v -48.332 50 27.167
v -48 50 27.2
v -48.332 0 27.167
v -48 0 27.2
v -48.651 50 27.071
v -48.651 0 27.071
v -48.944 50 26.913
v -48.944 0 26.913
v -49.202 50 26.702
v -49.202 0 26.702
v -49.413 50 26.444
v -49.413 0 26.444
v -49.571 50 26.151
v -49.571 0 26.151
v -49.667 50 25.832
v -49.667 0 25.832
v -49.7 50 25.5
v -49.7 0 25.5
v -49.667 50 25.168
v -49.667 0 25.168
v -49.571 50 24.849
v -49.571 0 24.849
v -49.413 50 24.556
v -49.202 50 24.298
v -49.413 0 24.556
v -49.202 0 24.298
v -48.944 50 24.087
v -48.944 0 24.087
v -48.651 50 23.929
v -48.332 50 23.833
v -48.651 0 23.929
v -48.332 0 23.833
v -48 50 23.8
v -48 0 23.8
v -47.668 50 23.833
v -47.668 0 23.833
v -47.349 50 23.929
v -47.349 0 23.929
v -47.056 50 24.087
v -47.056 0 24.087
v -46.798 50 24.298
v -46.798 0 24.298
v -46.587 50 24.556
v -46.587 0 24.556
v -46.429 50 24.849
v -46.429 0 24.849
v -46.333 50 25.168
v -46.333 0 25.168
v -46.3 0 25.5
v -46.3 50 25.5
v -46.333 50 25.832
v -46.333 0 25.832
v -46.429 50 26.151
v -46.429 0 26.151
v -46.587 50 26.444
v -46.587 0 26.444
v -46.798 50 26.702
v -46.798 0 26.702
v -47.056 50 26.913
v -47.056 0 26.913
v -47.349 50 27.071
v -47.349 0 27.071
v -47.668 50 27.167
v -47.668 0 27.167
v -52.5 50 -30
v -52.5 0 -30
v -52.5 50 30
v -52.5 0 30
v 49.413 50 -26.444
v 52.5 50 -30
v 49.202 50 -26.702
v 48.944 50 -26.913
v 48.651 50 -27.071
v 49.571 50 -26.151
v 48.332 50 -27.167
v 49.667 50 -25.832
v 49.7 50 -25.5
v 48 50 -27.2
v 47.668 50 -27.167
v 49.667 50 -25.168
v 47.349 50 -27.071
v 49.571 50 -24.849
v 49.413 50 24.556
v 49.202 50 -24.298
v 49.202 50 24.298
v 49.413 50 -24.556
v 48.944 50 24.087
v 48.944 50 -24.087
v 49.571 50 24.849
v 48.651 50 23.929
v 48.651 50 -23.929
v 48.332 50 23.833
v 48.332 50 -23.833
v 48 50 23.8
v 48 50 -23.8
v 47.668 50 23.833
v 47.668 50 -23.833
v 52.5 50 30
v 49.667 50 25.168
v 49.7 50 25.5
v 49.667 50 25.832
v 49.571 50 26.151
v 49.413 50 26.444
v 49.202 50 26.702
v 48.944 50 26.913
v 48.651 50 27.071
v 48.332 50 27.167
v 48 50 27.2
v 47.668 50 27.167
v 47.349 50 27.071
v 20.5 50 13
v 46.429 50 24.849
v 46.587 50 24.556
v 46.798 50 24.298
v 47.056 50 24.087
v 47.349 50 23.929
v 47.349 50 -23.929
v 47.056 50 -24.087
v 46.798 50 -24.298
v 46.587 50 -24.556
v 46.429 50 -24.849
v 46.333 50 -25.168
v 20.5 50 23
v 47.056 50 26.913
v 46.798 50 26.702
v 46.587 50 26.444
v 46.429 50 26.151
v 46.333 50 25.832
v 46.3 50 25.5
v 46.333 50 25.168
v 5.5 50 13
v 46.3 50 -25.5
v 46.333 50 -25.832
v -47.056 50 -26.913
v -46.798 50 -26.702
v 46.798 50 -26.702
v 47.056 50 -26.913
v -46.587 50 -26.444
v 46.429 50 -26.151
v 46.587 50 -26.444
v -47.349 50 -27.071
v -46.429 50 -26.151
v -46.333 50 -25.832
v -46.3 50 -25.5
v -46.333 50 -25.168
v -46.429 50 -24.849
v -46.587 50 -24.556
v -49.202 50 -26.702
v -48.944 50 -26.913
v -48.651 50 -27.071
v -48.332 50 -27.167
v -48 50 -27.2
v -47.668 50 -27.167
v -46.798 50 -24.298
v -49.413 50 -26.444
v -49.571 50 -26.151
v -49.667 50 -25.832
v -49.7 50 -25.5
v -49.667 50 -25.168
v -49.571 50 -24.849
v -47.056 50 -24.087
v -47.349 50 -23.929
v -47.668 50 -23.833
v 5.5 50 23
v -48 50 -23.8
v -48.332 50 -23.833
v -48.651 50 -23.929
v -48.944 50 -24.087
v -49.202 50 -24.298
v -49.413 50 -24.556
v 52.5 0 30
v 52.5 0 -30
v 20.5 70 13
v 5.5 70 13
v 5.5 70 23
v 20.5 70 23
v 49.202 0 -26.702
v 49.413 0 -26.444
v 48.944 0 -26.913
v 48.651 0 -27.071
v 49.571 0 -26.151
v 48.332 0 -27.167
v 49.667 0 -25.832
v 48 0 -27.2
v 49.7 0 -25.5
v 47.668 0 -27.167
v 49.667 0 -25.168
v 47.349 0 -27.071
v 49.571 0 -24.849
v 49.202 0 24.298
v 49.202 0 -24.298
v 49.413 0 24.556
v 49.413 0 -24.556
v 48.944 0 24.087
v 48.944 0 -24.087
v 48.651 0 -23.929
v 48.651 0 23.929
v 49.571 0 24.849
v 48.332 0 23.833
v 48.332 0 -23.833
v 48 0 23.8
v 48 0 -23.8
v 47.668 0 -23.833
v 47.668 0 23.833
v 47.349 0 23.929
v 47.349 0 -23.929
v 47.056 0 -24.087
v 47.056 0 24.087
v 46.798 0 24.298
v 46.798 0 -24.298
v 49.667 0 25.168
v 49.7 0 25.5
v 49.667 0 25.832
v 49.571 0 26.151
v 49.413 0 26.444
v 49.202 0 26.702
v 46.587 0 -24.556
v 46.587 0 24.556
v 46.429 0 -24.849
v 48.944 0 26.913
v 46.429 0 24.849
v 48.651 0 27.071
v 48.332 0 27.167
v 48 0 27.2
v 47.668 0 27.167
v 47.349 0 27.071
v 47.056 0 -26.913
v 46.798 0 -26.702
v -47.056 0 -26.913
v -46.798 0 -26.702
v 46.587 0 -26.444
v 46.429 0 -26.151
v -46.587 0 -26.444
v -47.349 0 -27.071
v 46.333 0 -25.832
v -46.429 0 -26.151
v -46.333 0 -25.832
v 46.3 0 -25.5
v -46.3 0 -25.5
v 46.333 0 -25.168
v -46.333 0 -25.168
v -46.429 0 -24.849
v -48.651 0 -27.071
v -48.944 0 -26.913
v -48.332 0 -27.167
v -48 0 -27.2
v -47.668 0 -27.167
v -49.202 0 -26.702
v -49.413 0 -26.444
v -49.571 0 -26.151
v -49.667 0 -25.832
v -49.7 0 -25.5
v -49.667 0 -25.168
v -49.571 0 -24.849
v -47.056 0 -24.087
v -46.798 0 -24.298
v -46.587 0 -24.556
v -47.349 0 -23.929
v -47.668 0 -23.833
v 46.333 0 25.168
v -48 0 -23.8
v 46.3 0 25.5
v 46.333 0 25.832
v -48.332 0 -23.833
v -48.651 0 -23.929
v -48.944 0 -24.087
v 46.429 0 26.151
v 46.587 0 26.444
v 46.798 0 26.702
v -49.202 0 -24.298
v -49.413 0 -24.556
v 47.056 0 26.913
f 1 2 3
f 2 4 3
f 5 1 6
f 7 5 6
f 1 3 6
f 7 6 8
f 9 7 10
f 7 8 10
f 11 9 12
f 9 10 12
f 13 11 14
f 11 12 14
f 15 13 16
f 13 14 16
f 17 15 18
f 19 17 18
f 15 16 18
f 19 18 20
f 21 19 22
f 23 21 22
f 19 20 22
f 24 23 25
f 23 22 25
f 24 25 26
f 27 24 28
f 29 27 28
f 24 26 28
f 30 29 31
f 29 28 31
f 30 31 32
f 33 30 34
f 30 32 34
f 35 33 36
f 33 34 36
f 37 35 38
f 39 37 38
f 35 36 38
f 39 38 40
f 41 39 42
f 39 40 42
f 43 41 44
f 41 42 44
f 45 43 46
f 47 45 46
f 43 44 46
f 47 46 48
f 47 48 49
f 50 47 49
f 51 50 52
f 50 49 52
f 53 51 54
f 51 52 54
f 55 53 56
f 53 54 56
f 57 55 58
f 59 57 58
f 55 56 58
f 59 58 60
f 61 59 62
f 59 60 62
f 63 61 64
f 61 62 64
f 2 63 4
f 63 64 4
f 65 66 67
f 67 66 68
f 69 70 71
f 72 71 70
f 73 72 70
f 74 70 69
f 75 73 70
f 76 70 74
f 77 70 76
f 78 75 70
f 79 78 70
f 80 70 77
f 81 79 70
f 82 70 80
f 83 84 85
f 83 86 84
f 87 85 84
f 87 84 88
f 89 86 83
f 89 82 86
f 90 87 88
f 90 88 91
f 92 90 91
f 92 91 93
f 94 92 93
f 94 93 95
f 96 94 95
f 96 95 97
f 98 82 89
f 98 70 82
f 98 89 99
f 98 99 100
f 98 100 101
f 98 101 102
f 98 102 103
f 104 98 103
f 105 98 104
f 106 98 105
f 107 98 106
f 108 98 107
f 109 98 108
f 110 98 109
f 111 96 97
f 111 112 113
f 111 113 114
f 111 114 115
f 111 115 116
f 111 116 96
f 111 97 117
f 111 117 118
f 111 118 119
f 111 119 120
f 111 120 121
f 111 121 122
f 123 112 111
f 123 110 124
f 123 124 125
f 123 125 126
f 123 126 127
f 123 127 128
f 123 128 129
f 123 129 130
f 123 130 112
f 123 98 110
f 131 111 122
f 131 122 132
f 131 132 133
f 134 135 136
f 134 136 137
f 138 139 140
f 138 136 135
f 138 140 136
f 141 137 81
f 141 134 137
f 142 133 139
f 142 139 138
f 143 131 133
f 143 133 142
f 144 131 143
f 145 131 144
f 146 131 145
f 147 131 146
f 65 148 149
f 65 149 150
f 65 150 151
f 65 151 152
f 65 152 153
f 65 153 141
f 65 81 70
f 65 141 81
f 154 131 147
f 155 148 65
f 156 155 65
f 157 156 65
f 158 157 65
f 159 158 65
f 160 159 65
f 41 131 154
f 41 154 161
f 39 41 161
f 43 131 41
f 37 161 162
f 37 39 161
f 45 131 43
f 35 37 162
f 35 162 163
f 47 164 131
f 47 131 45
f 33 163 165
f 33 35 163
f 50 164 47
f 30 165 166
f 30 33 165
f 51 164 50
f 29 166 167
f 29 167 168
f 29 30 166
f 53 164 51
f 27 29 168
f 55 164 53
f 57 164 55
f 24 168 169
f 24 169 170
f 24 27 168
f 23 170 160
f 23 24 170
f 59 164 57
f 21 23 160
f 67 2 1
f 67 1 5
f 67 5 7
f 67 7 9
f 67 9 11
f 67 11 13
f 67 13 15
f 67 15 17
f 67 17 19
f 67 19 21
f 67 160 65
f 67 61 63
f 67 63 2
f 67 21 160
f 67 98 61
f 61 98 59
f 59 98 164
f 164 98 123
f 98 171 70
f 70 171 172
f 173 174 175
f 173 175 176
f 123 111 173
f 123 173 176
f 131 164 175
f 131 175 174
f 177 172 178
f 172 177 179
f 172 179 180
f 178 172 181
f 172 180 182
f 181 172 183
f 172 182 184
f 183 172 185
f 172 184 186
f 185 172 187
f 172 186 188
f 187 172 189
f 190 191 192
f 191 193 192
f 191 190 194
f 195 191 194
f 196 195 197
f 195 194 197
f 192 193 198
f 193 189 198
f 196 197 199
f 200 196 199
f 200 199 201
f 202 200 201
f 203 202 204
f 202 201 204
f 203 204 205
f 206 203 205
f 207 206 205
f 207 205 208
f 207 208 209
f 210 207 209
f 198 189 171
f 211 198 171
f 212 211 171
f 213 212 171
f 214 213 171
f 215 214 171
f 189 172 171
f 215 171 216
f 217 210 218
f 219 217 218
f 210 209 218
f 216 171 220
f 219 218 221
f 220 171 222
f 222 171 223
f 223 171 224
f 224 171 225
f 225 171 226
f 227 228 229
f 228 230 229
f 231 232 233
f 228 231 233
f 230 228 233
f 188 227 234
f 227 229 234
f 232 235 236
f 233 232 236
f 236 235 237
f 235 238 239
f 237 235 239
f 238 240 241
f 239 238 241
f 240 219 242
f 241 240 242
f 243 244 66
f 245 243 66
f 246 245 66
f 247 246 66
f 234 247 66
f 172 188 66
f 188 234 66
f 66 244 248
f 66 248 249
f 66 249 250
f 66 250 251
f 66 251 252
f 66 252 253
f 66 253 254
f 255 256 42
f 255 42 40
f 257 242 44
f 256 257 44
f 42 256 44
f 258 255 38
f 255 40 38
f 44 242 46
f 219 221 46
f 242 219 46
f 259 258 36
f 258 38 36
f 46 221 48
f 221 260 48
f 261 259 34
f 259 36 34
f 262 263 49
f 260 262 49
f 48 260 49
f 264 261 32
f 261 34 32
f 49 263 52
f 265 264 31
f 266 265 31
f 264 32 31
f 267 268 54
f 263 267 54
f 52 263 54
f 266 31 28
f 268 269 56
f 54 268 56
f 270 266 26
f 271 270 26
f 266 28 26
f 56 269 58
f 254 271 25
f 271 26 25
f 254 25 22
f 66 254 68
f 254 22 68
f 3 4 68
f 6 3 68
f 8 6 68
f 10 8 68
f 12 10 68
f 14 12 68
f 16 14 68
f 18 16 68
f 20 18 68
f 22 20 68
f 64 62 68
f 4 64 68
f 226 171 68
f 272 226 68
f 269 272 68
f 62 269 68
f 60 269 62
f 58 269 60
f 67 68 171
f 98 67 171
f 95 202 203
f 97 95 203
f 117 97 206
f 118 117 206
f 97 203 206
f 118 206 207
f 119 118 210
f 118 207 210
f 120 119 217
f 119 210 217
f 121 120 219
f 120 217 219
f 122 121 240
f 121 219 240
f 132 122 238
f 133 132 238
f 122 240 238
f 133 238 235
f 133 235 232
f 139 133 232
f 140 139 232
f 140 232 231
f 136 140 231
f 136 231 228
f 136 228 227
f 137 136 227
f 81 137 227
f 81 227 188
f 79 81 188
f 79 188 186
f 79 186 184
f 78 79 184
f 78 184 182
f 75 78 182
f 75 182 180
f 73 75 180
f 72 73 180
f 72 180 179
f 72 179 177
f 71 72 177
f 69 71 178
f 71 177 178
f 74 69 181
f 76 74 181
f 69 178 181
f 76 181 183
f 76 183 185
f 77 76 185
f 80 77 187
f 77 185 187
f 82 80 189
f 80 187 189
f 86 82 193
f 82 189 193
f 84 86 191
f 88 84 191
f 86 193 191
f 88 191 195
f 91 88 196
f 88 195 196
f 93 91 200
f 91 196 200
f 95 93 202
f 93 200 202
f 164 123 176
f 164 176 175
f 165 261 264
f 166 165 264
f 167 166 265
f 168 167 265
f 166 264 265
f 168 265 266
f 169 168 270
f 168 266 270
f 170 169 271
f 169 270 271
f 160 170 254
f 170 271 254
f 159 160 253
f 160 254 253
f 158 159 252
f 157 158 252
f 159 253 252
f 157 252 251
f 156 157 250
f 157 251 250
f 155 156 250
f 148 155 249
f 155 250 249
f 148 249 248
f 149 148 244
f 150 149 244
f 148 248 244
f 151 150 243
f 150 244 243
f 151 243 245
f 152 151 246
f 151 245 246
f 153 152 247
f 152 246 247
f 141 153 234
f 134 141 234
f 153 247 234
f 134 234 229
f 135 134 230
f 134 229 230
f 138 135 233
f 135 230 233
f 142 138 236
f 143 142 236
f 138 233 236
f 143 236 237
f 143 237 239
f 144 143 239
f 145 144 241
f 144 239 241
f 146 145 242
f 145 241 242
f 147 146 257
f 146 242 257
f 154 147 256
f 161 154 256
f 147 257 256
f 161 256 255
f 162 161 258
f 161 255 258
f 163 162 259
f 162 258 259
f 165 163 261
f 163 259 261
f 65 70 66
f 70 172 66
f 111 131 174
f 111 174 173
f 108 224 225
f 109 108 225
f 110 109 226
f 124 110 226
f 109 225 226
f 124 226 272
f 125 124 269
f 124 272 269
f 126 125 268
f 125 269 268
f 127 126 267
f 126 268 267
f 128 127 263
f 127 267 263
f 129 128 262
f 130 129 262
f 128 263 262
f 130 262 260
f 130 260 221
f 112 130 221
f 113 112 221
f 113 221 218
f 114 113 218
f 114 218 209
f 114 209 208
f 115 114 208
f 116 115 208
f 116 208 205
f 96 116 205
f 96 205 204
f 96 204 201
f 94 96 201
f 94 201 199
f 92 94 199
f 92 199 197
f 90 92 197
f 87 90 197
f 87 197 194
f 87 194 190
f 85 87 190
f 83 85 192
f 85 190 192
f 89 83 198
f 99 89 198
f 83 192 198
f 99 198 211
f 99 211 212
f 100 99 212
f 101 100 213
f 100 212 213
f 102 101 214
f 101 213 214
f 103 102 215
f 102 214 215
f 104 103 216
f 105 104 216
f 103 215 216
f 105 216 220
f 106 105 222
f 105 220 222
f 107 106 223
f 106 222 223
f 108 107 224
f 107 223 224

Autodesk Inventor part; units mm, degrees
ref_plane "YZ Plane" through (0, 0, 0) normal (1, 0, 0) x (0, 1, 0)
ref_plane "XZ Plane" through (0, 0, 0) normal (0, 1, 0) x (-1, 0, 0)
ref_plane "XY Plane" through (0, 0, 0) normal (0, 0, 1) x (1, 0, 0)
sketch "Náčrt1" plane through (0, 0, 0) normal (0, 1, 0) x (-1, 0, 0)
  line L0 (0, -42) -> (0, 42) projected
  line L1 (-73.5, 0) -> (73.5, 0) projected
  line L2 (52.5, 30) -> (-52.5, 30)
  line L3 (-52.5, 30) -> (-52.5, -30)
  line L4 (-52.5, -30) -> (52.5, -30)
  line L5 (52.5, -30) -> (52.5, 30)
  point P0 (0, 0)
  dimension "d0" = 105
  dimension "d1" = 60
extrude "Vysunutí1" add sketch "Náčrt1" along normal blind 50
sketch "Náčrt2" plane through (0, 50, 0) normal (0, 1, 0) x (1, 0, 0)
  line L0 (0, 42) -> (0, -42) projected
  line L1 (73.5, 0) -> (-73.5, 0) projected
  point P0 (0, 0)
  point P1 (-48, 25.5)
  point P2 (-48, -25.5)
  point P3 (48, -25.5)
  point P4 (48, 25.5)
  dimension "d4" = 96
  dimension "d5" = 51
  dimension "d6" = 51
  dimension "d7" = 96
  dimension "d8" = 48
  dimension "d9" = 25.5
  dimension "d10" = 25.5
  dimension "d11" = 48
hole "Díra1" at (-48, 50, -25.5) at (-48, 50, 25.5) at (48, 50, 25.5) at (48, 50, -25.5) direction (0, -1, 0) diameter 3.4 end through all clearance for "Šroub se zápustnou hlavou ISO 2009/7046" size "M3" standard "ISO"
sketch "Náčrt3" plane through (0, 50, 0) normal (0, 1, 0) x (1, 0, 0)
  line L0 (5.5, -13) -> (20.5, -13)
  line L1 (20.5, -13) -> (20.5, -23)
  line L2 (20.5, -23) -> (5.5, -23)
  line L3 (5.5, -23) -> (5.5, -13)
  line L4 (52.5, -30) -> (52.5, 30) projected
  line L5 (-52.5, -30) -> (52.5, -30) projected
  point P0 (0, 0)
  dimension "d19" = 15
  dimension "d20" = 10
  dimension "d21" = 32
  dimension "d22" = 7
extrude "Vysunutí2" add sketch "Náčrt3" along normal blind 20
properties part number "prop_PCB"
